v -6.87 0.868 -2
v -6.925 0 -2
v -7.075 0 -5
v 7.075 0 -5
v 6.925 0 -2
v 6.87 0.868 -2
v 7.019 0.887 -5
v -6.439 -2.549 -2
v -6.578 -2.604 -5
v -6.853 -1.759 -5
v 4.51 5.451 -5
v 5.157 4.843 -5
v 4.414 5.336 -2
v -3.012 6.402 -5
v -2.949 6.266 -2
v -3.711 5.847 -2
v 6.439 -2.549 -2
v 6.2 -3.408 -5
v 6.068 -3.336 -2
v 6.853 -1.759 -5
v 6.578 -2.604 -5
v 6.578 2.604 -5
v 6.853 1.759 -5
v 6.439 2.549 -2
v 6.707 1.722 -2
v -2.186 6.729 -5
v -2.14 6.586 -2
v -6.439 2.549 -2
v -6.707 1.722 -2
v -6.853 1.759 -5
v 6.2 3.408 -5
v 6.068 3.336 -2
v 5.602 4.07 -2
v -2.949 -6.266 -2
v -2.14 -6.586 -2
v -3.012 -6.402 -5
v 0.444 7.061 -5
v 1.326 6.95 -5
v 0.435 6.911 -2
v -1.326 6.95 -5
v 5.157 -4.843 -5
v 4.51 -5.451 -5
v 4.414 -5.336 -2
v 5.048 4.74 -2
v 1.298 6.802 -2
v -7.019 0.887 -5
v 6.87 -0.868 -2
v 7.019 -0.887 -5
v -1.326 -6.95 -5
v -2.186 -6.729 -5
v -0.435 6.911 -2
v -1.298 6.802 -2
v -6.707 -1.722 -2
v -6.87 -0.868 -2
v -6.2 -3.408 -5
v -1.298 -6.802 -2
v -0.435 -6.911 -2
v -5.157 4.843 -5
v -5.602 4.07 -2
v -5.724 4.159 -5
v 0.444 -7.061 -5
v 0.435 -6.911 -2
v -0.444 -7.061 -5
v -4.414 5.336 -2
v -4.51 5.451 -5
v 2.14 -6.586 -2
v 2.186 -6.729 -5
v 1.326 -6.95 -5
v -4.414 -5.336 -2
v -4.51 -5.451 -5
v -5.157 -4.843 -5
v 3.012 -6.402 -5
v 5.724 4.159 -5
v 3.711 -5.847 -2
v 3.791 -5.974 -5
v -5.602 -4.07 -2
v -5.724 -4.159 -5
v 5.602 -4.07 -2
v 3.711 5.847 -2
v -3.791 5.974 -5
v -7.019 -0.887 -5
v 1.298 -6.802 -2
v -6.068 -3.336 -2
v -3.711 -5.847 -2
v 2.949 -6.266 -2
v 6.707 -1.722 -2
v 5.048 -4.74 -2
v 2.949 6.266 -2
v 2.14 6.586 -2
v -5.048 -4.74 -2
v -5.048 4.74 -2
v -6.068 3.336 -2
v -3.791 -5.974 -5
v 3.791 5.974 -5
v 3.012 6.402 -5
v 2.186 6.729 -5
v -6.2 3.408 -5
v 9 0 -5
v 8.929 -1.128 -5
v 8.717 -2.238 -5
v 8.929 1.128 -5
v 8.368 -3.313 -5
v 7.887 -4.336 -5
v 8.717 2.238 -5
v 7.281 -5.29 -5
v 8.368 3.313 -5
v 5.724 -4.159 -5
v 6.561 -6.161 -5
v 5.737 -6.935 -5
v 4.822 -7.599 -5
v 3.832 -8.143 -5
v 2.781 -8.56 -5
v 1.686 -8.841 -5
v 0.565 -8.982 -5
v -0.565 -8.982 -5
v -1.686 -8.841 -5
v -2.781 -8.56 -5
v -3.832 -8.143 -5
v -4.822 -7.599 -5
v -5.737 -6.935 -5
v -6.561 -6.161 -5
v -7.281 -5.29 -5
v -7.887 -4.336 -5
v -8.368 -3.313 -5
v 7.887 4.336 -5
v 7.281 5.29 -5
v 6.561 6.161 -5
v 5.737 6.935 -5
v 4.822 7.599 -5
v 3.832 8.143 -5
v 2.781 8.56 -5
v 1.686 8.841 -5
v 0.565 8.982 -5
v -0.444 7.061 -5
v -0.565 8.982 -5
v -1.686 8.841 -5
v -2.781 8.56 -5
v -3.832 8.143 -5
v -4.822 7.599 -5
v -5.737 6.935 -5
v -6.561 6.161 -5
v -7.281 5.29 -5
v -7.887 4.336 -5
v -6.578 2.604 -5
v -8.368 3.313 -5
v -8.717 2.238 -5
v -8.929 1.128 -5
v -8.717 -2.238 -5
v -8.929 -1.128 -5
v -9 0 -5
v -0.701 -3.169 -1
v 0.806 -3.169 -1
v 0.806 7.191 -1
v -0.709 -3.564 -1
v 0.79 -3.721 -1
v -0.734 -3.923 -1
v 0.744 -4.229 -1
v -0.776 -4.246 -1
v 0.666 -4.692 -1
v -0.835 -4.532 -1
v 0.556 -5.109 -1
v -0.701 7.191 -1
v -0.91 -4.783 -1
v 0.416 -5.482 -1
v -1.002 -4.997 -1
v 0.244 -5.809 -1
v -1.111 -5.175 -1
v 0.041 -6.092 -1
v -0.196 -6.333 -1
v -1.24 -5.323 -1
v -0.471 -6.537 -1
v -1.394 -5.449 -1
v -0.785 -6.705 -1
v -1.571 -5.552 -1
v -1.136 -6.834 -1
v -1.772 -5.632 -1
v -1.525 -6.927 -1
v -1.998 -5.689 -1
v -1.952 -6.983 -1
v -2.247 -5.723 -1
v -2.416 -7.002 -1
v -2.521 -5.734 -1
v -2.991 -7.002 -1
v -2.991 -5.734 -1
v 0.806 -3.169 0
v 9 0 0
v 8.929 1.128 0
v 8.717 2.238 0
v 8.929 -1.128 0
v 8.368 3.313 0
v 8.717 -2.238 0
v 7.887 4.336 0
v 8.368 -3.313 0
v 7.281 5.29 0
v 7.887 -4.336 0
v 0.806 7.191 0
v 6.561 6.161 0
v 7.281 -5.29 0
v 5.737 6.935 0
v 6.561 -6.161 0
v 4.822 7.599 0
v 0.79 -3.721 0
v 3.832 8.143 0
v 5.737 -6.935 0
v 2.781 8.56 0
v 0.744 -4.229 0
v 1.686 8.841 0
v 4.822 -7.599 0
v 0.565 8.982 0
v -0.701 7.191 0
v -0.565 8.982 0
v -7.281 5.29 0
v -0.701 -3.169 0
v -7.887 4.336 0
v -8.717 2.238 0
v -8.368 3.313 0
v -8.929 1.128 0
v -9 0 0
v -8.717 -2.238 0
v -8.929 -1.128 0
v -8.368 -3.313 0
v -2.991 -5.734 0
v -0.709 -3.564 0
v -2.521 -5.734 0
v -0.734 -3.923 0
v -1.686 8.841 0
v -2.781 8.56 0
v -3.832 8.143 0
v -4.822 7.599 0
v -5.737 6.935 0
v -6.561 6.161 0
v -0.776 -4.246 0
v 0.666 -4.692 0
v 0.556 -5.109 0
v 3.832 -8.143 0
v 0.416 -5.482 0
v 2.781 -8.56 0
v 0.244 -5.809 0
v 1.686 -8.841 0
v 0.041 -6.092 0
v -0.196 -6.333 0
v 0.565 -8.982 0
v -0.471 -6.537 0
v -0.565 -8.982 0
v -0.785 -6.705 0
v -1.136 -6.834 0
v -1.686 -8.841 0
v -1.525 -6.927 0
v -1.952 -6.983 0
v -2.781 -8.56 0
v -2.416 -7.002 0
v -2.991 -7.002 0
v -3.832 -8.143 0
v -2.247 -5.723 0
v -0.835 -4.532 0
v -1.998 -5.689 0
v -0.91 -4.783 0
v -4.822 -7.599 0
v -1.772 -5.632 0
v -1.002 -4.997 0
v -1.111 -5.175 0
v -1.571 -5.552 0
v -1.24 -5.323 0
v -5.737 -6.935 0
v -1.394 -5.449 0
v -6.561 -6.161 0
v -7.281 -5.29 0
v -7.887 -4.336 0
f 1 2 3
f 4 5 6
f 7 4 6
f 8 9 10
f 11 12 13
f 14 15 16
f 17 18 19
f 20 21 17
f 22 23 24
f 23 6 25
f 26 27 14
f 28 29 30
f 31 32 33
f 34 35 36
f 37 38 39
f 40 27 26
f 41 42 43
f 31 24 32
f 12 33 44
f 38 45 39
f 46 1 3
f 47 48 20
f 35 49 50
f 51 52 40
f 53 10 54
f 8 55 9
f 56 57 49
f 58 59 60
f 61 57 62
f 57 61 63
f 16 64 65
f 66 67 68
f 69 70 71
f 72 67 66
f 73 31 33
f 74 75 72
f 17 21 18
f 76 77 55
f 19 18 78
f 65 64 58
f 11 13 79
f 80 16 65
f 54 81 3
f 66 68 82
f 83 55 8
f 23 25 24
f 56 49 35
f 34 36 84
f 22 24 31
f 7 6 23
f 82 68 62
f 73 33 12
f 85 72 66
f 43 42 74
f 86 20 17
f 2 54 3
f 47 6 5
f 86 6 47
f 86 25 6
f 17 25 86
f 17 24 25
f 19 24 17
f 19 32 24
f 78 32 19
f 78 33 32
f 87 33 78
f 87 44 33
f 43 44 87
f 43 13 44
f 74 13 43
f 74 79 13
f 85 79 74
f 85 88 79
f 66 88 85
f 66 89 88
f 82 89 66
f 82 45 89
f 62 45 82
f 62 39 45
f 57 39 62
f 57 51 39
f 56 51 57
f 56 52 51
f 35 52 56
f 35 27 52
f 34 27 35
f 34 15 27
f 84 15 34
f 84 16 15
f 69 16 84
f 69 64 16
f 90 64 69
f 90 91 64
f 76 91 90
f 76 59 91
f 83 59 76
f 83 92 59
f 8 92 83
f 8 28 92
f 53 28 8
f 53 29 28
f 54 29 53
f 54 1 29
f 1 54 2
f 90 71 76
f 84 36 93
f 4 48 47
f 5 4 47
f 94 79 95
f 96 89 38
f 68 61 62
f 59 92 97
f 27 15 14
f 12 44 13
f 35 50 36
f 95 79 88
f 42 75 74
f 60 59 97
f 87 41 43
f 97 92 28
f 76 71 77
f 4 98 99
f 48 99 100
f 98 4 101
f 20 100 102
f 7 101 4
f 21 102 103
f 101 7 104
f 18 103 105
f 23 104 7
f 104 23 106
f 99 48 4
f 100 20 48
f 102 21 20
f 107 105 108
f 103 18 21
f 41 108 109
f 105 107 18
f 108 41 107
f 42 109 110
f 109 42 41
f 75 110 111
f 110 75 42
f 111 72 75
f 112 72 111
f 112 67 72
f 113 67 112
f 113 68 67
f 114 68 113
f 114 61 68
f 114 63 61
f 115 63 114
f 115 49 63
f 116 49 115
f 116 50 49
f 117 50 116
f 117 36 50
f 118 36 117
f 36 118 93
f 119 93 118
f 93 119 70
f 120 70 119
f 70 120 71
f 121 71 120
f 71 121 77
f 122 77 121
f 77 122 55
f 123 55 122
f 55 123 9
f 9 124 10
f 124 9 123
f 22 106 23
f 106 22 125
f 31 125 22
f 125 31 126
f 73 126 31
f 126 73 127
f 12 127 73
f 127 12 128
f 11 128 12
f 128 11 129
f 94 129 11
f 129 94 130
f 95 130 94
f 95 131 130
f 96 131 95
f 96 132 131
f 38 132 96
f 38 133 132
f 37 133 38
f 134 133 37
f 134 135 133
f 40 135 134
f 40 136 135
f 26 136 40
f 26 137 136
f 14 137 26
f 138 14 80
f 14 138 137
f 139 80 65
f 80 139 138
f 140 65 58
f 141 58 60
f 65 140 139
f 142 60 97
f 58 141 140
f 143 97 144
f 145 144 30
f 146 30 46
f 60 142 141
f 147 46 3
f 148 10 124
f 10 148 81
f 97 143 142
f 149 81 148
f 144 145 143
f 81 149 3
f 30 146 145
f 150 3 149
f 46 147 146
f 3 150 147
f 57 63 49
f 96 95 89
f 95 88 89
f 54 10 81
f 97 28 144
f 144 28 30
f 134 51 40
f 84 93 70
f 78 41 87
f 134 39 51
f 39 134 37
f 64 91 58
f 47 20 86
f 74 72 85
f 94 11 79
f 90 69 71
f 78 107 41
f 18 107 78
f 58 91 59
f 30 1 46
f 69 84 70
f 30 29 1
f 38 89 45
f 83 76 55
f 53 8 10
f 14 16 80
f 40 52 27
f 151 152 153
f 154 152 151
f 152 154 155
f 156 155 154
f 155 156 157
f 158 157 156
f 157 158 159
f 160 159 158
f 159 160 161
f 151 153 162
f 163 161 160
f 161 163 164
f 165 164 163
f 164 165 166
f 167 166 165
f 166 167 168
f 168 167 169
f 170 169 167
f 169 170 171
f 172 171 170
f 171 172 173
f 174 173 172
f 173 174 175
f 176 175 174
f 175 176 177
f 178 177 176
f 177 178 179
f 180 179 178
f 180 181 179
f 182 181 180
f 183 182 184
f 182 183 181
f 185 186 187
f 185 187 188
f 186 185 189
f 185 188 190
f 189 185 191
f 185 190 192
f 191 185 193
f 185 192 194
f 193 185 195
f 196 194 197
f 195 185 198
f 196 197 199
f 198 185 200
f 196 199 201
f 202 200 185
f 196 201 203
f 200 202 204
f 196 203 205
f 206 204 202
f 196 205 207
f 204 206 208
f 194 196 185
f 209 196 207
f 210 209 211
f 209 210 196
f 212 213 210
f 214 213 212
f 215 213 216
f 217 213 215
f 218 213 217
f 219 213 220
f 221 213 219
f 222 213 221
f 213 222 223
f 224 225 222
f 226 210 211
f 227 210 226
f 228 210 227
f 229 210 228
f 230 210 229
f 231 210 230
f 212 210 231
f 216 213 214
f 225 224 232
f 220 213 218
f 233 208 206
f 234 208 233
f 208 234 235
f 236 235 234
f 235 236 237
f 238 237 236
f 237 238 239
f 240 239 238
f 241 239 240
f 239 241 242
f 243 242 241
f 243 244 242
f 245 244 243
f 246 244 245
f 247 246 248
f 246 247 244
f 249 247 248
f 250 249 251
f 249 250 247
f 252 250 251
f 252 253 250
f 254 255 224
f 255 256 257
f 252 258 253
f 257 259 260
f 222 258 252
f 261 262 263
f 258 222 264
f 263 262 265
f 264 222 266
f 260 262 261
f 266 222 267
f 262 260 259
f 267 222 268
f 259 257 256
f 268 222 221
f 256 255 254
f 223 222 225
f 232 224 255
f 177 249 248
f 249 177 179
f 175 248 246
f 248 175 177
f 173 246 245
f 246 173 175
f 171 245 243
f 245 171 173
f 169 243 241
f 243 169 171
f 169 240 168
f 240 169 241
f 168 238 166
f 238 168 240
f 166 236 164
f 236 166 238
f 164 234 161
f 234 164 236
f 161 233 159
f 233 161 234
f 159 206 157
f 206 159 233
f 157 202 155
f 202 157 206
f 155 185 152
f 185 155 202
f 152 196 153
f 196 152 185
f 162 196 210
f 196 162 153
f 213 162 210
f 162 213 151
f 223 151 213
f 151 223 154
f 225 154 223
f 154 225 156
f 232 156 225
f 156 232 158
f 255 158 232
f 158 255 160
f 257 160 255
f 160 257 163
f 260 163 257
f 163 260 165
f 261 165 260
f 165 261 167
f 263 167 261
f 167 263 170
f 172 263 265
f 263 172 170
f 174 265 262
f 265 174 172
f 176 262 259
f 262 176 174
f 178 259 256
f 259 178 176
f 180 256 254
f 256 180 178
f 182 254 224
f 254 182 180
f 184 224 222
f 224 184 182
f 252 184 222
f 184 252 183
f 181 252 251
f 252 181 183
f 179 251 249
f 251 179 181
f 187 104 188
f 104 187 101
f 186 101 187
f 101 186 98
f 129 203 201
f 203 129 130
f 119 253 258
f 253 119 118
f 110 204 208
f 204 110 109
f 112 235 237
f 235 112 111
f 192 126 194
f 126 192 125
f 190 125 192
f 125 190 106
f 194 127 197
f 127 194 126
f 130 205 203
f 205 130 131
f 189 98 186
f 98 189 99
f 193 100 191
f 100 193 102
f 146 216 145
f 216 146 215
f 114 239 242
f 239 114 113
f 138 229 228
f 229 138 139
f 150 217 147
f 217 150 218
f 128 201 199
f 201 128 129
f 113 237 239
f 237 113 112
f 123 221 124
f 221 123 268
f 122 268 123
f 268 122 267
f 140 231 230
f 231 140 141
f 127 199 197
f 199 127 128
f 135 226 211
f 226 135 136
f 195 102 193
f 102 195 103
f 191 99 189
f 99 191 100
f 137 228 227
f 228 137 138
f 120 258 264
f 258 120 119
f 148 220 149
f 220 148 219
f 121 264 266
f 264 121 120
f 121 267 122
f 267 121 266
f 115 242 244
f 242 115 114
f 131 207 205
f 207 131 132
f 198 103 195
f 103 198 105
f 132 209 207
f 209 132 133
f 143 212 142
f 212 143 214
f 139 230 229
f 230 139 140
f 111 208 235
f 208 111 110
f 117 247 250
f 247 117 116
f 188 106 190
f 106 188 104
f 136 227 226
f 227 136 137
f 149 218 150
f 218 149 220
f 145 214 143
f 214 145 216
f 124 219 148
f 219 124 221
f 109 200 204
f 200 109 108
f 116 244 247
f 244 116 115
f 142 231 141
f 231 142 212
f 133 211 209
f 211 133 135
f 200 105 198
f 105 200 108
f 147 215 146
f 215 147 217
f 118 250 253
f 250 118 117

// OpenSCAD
$fn = 50;

difference() {
	union() {
		translate(v = [0, 0, -5.0]) {
			cylinder(h = 5, r = 9.0);
		}
	}
	union() {
		#translate(v = [0, 0, -5.0]) {
			cylinder(h = 3, r1 = 7.075, r2 = 6.925);
		}
		translate(v = [0, 0, -1]) {
			linear_extrude(height = 1) {
				text(font = "Wingdings", halign = "center", size = 11, text = "J", valign = "center");
			}
		}
	}
}
